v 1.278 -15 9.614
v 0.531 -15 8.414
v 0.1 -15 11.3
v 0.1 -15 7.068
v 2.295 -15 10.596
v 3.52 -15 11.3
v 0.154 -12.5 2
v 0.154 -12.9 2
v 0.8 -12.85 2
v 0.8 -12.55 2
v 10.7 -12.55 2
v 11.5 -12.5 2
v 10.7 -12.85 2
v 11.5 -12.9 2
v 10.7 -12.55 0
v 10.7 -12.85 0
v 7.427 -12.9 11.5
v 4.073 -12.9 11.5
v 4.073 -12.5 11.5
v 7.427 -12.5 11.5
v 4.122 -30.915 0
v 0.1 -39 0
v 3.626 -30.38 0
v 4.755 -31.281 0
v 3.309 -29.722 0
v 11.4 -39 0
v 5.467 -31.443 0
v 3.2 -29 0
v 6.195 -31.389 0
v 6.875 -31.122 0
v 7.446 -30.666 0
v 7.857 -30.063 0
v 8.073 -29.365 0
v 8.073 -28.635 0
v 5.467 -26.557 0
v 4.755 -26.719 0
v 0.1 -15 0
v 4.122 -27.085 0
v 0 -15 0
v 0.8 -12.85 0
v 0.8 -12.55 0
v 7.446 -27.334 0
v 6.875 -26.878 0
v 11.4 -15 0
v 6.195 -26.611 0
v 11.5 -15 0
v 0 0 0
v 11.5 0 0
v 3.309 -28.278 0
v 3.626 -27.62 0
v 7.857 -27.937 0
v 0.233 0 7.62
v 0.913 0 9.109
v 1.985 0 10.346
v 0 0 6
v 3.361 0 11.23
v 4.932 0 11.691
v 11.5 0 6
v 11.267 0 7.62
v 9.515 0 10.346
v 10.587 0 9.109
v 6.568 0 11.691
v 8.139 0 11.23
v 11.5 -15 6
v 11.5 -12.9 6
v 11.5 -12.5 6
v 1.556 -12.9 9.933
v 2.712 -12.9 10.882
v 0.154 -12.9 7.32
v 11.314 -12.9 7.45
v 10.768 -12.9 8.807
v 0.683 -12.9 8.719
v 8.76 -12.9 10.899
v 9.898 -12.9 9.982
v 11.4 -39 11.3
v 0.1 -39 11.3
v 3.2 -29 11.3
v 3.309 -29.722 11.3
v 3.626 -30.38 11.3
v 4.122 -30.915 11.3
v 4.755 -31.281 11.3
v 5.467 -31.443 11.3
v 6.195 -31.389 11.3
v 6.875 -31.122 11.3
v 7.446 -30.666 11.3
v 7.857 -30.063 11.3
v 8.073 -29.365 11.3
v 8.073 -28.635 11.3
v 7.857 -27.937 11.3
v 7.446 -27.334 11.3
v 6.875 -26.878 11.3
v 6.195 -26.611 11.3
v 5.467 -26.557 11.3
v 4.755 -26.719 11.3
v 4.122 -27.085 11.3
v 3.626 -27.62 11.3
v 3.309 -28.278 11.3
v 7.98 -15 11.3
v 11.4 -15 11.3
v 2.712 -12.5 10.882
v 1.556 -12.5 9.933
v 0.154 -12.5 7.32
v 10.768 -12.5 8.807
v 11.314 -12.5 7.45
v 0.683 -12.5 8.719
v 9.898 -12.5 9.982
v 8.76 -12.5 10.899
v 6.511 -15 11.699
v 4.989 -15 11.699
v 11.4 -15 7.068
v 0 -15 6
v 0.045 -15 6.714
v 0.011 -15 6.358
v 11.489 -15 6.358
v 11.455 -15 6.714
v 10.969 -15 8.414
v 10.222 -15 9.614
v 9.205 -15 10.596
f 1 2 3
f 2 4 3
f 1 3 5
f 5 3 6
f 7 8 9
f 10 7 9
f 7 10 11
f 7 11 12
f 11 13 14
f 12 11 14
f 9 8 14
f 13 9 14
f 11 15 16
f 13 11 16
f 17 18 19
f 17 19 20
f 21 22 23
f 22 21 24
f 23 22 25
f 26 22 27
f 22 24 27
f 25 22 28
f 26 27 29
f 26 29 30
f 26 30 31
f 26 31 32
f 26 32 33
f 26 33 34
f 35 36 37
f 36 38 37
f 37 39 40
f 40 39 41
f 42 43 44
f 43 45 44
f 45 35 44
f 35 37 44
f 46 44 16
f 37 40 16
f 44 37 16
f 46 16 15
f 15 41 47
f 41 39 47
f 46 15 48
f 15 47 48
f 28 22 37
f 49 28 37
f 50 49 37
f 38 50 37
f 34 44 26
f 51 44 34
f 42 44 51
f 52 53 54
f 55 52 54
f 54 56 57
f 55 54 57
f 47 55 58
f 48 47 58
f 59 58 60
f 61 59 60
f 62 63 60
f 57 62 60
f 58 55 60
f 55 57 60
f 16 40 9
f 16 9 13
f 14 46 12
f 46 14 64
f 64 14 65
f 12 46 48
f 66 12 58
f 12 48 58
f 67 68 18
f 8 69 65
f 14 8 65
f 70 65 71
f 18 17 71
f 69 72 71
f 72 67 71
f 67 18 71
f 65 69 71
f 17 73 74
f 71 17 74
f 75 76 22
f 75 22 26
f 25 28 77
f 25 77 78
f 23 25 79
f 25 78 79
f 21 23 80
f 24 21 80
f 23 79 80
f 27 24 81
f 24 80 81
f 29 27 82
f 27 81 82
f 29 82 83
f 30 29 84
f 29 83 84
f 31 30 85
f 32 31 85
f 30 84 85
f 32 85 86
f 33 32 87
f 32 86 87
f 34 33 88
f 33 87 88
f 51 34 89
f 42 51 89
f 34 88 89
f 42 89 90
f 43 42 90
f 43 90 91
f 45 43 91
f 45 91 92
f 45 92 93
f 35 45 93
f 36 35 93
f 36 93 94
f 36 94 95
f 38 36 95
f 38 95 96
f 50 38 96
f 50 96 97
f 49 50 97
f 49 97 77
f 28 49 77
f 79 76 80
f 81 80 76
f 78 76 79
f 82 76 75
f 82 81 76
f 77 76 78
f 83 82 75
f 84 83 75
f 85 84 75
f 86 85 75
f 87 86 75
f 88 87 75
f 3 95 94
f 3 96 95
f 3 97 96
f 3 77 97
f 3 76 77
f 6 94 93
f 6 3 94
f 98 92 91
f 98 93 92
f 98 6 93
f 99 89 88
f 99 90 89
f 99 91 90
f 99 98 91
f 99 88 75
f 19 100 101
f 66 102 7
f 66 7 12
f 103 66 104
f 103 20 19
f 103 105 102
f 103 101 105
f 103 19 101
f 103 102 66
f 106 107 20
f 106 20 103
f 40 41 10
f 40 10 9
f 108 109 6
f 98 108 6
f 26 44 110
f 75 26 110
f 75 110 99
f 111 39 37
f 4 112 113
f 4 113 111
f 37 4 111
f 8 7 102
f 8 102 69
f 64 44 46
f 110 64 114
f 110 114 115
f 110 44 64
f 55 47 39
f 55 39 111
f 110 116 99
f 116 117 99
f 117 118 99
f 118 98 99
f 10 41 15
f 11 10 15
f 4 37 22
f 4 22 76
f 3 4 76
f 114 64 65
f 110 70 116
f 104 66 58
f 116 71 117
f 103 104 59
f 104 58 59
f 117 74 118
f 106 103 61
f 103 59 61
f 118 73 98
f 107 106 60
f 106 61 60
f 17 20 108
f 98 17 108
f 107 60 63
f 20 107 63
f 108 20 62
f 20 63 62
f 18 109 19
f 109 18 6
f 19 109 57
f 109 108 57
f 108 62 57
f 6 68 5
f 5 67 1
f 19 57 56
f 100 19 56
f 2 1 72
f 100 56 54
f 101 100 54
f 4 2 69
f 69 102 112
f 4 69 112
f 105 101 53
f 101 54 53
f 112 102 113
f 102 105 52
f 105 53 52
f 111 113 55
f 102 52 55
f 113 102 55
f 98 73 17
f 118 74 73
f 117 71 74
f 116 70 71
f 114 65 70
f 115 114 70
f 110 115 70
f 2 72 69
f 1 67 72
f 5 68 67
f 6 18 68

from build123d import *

# Parameters (mm, degrees)
F0_W      = 11.5
F0_H      = 6
F1_DEPTH  = 15
F2_W      = 11.3
F2_H      = 11.3
F3_DEPTH  = 24
F5_W      = 12.6701932168
F5_H      = 0.4
F6_DEPTH  = 5.5
F7_W      = 9.9
F7_H      = 0.3
F8_DEPTH  = 6
F9_D      = 4.9
F10_DEPTH = 4


with BuildPart() as f1:
    # F0 (on Front) → F1 (new body)
    with BuildSketch(Plane.XZ):
        with BuildLine():
            ThreePointArc((11.5, 6), (5.75, 11.75), (0, 6))
            Line((0, 6), (11.5, 6))
        make_face()
        with Locations((5.75, 3)):
            Rectangle(F0_W, F0_H)
    extrude(amount=F1_DEPTH)

    # F2 (on face) → F3 (join)
    with BuildSketch(Plane.XZ.offset(15)):
        with Locations((5.75, 5.65)):
            Rectangle(F2_W, F2_H)
    extrude(amount=F3_DEPTH)

    # F5 (on 3pt) → F6 (cut)
    with BuildSketch(Plane(origin=(0, 0, 6), x_dir=(1, 0, 0), z_dir=(0, 0, -1))):
        with Locations((6.4887672779, 12.7)):
            Rectangle(F5_W, F5_H)
    extrude(amount=-F6_DEPTH, mode=Mode.SUBTRACT)

    # F7 (on face) → F8 (cut, through all)
    with BuildSketch(Plane(origin=(0, 0, 0), x_dir=(1, 0, 0), z_dir=(0, 0, -1))):
        with Locations((5.75, 12.7)):
            Rectangle(F7_W, F7_H)
    extrude(amount=-F8_DEPTH, mode=Mode.SUBTRACT)

    # F9 (through all)
    with Locations(Plane(origin=(0, 0, 0), x_dir=(1, 0, 0), z_dir=(0, 0, -1))):
        with Locations((5.65, 29)):
            Hole(F9_D / 2)

    # F5 (on 3pt) → F10 (cut)
    with BuildSketch(Plane(origin=(0, 0, 6), x_dir=(1, 0, 0), z_dir=(0, 0, -1))):
        with Locations((6.4887672779, 12.7)):
            Rectangle(F5_W, F5_H)
    extrude(amount=F10_DEPTH, mode=Mode.SUBTRACT)


solid = f1.part
